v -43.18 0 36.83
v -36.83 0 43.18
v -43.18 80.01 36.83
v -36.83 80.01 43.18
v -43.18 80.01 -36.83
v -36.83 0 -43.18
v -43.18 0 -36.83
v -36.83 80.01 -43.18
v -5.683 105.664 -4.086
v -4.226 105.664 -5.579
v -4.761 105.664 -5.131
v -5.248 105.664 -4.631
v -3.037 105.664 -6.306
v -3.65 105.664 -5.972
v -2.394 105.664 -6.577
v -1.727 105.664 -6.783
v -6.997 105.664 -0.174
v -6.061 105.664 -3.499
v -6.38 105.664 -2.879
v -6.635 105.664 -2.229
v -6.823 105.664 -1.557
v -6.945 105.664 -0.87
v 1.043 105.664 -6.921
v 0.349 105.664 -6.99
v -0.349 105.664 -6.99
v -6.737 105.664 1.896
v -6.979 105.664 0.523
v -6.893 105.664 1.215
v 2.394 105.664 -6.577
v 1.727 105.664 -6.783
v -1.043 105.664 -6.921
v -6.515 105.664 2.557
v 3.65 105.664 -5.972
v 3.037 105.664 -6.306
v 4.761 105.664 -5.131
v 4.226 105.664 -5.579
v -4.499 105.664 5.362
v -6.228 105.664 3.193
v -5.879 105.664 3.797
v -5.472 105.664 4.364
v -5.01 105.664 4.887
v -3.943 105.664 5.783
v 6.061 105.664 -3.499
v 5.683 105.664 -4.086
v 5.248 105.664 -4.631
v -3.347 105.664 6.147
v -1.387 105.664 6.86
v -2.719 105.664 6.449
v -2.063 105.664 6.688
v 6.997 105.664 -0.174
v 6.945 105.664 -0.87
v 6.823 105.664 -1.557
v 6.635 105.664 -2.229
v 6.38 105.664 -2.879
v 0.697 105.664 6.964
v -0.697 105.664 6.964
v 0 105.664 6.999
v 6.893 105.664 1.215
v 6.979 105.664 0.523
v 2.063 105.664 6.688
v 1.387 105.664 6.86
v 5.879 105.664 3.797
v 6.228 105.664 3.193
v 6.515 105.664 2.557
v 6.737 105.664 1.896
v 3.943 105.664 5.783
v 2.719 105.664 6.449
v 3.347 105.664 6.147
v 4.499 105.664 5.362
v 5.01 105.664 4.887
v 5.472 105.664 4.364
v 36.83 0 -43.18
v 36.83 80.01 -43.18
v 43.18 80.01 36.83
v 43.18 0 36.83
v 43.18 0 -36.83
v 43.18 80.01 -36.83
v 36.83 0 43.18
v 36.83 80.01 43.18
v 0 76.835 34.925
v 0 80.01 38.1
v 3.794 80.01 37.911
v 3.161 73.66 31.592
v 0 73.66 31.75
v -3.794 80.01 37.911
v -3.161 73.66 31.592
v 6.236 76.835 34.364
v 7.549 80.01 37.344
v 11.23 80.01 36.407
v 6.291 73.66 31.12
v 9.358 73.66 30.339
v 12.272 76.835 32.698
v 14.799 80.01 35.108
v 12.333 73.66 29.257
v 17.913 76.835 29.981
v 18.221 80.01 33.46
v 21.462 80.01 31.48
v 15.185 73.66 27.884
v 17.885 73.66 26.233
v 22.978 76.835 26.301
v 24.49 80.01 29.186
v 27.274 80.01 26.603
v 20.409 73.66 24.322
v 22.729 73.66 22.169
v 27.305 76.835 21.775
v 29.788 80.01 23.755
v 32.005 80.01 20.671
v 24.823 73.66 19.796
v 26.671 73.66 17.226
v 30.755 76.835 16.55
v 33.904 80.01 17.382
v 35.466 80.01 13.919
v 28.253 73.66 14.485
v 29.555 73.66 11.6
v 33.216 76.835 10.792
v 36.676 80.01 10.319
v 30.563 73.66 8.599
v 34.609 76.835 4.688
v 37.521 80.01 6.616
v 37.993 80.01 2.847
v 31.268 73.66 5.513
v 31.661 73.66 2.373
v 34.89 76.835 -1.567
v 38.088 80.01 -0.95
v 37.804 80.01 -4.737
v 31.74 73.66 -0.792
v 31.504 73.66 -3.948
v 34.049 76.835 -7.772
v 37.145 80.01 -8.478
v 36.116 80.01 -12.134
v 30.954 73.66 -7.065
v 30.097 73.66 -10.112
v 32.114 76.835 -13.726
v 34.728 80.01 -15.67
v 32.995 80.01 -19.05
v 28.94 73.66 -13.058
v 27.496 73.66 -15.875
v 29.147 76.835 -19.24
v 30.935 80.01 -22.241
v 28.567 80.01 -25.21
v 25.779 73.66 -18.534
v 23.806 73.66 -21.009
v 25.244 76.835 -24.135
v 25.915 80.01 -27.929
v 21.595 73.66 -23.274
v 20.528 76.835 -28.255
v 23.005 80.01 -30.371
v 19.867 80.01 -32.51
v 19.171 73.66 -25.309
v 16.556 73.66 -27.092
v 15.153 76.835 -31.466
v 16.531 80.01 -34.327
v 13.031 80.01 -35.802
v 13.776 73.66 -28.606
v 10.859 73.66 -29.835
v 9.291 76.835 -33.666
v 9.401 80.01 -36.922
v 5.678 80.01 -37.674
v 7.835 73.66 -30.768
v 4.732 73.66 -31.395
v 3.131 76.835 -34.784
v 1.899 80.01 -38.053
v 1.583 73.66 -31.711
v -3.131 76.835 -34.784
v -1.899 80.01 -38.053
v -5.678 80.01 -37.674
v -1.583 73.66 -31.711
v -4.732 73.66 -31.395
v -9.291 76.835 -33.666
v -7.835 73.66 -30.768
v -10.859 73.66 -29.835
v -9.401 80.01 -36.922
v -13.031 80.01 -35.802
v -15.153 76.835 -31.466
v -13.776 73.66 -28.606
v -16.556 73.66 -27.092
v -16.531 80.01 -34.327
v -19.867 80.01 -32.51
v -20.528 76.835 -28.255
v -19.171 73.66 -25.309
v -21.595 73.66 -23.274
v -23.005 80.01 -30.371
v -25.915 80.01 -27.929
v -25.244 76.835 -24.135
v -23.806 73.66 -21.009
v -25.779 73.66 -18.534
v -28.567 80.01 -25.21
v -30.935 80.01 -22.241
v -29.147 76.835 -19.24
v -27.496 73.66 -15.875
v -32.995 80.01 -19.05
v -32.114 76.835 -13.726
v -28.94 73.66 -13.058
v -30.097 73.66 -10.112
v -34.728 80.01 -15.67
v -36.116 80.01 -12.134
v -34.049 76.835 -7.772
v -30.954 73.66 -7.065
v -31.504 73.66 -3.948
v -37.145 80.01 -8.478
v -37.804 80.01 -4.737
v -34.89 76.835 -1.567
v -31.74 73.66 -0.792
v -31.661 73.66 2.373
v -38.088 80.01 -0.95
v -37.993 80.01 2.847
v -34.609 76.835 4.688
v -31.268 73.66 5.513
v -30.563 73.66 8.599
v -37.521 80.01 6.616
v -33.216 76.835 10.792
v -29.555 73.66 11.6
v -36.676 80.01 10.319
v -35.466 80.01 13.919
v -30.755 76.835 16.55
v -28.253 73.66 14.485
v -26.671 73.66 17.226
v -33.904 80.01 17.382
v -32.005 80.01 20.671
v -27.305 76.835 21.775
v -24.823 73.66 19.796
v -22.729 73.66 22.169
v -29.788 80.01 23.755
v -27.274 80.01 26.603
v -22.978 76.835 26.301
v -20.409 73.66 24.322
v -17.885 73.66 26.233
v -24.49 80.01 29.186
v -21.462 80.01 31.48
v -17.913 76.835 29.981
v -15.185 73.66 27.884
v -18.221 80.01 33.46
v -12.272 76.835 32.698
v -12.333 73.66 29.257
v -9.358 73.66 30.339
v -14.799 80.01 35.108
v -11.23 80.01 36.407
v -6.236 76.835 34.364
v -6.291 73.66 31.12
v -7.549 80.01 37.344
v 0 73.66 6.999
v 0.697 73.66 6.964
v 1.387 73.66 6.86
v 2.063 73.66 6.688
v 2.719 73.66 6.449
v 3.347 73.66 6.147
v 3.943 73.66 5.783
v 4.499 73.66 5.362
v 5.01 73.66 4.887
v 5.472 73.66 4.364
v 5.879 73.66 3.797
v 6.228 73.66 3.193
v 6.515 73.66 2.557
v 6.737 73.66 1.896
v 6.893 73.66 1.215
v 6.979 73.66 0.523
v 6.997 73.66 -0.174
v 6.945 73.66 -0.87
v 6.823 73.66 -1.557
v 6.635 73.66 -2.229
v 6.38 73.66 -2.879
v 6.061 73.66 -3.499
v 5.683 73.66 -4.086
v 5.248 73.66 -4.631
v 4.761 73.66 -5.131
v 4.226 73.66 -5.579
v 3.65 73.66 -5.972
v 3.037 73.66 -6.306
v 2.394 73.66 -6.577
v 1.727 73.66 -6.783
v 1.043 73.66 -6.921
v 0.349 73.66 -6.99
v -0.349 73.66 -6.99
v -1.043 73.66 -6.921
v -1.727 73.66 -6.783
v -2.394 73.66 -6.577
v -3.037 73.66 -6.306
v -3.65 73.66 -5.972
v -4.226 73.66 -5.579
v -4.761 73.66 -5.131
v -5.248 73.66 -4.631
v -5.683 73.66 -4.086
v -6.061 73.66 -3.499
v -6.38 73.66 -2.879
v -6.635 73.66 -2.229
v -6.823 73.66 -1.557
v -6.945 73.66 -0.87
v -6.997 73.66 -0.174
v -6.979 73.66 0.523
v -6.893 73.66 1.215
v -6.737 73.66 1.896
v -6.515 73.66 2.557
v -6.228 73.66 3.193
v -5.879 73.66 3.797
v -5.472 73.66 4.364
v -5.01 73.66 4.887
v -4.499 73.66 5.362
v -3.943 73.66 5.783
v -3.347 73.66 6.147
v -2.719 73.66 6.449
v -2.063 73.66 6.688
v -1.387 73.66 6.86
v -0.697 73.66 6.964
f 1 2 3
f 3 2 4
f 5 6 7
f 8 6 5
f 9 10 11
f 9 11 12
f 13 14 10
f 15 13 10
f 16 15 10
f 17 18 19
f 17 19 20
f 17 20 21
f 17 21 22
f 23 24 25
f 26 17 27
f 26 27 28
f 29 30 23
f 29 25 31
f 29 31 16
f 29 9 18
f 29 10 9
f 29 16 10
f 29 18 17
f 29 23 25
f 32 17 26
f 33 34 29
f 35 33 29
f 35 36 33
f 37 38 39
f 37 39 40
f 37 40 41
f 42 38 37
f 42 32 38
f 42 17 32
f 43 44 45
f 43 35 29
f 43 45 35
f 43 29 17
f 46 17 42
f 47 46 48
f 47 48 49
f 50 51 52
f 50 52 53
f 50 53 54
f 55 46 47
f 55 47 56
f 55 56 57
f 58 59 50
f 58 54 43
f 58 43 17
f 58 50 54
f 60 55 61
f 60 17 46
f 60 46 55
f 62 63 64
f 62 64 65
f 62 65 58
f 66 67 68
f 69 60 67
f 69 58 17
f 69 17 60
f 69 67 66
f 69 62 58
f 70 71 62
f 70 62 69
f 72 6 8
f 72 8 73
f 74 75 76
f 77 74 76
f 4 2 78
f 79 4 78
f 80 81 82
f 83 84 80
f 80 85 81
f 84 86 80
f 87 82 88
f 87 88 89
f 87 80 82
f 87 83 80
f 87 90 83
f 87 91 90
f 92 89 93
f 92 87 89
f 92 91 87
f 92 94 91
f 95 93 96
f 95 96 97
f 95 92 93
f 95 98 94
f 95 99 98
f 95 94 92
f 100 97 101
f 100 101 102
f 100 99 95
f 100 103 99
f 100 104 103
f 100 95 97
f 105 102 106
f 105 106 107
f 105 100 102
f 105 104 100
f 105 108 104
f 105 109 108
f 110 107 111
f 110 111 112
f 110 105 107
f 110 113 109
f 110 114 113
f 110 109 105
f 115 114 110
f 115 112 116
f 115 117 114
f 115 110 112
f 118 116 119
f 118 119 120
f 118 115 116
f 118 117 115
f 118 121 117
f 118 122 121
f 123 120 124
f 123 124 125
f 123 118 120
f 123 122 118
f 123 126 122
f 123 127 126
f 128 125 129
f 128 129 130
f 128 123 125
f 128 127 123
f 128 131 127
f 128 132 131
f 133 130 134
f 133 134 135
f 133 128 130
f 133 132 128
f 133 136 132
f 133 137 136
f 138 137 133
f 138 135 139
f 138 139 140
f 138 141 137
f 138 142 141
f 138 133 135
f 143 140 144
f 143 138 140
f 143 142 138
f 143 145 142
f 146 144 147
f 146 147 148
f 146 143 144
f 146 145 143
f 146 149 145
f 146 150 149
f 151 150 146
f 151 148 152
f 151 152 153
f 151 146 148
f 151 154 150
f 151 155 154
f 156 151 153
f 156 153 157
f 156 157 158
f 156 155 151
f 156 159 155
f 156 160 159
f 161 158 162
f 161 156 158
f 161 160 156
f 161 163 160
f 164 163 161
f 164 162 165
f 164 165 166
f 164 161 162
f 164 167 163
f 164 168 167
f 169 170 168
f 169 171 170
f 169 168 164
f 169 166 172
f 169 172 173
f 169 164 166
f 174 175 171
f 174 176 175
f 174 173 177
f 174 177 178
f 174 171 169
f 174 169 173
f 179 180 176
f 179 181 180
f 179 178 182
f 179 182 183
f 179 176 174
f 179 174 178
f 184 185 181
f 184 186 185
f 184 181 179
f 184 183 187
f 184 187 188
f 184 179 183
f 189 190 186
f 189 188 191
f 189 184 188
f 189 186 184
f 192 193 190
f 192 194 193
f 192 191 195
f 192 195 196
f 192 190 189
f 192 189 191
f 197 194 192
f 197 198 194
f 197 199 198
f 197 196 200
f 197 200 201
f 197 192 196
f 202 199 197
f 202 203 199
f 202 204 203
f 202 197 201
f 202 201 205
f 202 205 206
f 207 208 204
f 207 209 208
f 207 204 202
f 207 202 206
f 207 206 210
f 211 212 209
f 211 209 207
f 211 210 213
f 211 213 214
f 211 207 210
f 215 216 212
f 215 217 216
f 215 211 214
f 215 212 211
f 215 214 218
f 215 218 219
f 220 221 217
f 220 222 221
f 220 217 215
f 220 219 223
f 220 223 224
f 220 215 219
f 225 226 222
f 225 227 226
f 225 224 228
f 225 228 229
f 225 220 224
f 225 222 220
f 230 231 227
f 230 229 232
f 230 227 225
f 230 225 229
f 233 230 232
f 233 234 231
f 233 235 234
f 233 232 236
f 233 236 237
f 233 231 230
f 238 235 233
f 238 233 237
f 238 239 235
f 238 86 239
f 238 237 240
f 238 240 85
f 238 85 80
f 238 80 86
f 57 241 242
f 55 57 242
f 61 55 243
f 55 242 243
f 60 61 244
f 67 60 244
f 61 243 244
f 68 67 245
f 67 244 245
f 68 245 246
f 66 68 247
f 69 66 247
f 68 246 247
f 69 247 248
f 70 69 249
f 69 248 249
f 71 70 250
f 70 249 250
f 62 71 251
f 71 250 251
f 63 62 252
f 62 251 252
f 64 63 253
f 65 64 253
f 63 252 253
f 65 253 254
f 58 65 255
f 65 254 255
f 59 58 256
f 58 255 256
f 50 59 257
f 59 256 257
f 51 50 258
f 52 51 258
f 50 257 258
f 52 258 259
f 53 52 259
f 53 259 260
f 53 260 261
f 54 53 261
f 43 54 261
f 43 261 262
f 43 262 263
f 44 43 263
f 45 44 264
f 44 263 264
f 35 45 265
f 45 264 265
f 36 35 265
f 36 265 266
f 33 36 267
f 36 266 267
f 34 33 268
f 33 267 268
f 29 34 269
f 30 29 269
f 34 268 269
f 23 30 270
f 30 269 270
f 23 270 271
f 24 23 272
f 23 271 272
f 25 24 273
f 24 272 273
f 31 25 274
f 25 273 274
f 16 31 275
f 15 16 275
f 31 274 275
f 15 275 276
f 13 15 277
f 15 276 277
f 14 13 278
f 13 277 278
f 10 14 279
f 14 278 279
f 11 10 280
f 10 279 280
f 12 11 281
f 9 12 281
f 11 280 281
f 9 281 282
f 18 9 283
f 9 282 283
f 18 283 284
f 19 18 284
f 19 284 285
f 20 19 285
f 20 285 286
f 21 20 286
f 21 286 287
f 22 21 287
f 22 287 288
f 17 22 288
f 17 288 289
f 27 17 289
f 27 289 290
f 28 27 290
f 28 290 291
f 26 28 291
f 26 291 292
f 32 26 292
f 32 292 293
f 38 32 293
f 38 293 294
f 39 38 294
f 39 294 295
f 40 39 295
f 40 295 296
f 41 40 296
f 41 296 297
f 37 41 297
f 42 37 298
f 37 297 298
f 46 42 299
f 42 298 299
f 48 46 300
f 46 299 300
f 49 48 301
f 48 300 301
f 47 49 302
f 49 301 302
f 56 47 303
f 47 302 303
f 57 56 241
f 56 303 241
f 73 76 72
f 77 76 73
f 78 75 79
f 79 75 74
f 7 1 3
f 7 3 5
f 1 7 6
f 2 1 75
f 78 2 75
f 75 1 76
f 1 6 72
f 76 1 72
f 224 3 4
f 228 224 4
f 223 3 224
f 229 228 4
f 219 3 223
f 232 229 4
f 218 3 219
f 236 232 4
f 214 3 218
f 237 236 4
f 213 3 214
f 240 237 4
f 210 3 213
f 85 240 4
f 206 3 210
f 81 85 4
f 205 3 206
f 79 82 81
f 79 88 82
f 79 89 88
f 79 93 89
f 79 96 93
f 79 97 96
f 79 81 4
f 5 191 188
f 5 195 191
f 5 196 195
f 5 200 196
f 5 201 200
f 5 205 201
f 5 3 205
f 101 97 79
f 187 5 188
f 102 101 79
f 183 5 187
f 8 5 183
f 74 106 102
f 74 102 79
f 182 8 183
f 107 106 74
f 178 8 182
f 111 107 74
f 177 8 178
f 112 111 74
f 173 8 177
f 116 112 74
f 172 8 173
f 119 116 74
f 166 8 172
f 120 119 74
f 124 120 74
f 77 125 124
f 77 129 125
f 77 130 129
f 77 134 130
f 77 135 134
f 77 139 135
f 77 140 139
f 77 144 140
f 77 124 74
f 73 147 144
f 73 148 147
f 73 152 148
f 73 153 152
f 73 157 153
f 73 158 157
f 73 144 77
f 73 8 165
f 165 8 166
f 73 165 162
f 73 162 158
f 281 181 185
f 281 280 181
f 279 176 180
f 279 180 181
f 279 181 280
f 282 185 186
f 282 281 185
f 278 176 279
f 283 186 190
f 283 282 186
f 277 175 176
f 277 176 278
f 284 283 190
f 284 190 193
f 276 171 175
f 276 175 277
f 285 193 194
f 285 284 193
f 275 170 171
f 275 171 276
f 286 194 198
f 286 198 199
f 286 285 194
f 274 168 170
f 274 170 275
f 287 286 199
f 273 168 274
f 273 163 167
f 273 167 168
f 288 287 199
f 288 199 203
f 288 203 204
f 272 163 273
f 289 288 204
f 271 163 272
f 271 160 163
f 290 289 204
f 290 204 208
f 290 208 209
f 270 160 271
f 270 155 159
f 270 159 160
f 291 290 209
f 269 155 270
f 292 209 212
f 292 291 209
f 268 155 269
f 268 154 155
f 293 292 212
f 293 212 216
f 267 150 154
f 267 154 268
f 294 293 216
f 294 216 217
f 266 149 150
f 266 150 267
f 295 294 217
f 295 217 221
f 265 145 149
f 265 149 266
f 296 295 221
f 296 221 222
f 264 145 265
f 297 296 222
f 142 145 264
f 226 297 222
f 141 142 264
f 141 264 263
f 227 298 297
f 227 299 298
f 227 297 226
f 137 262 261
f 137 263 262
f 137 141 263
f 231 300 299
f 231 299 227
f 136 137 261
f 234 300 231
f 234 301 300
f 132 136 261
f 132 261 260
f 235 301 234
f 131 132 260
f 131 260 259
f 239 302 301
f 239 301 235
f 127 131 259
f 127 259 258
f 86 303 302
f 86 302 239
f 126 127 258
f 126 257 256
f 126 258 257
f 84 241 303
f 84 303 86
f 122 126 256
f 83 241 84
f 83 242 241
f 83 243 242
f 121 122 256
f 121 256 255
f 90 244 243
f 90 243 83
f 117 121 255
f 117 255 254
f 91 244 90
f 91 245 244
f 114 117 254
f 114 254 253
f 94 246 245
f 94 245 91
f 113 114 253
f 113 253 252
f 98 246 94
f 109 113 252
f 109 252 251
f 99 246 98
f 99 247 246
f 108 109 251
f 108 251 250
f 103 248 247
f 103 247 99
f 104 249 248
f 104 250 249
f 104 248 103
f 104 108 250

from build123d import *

# Parameters (mm, degrees)
SKETCH1_W           = 86.36
SKETCH1_H           = 86.36
BOSS_EXTRUDE1_DEPTH = 80.01
SKETCH2_R           = 31.75
CUT_EXTRUDE1_DEPTH  = 6.35
CHAMFER1_SIZE       = 6.35
SKETCH3_R           = 6.99897
BOSS_EXTRUDE2_DEPTH = 32.004
CHAMFER2_SIZE       = 6.35


with BuildPart() as part:
    # Sketch1 → Boss-Extrude1 (new body)
    with BuildSketch(Plane(origin=(0, 0, 0), x_dir=(1, 0, 0), z_dir=(0, 1, 0))):
        Rectangle(SKETCH1_W, SKETCH1_H)
    extrude(amount=BOSS_EXTRUDE1_DEPTH)

    # Sketch2 → Cut-Extrude1 (cut)
    with BuildSketch(Plane(origin=(0, 80.01, 0), x_dir=(1, 0, 0), z_dir=(0, 1, 0))):
        with Locations(Location((0, 0, 0), (0, 0, 270))):
            Circle(SKETCH2_R)
    extrude(amount=-CUT_EXTRUDE1_DEPTH, mode=Mode.SUBTRACT)

    # Chamfer1
    chamfer1_edges = [part.edges().sort_by_distance(p)[0] for p in [
        (43.18, 40.005, 43.18),
        (-43.18, 40.005, 43.18),
        (-43.18, 40.005, -43.18),
        (43.18, 40.005, -43.18),
    ]]
    chamfer(chamfer1_edges, length=CHAMFER1_SIZE)

    # Sketch3 → Boss-Extrude2 (add)
    with BuildSketch(Plane(origin=(0, 73.66, 0), x_dir=(1, 0, 0), z_dir=(0, 1, 0))):
        with Locations(Location((0, 0, 0), (0, 0, 270))):
            Circle(SKETCH3_R)
    extrude(amount=BOSS_EXTRUDE2_DEPTH)

    # Chamfer2
    chamfer2_edges = [part.edges().sort_by_distance(p)[0] for p in [
        (0, 80.01, -31.75),
    ]]
    chamfer(chamfer2_edges, length=CHAMFER2_SIZE - 0.0001)  # a hair under: the kernel refuses the full size


solid = part.part
